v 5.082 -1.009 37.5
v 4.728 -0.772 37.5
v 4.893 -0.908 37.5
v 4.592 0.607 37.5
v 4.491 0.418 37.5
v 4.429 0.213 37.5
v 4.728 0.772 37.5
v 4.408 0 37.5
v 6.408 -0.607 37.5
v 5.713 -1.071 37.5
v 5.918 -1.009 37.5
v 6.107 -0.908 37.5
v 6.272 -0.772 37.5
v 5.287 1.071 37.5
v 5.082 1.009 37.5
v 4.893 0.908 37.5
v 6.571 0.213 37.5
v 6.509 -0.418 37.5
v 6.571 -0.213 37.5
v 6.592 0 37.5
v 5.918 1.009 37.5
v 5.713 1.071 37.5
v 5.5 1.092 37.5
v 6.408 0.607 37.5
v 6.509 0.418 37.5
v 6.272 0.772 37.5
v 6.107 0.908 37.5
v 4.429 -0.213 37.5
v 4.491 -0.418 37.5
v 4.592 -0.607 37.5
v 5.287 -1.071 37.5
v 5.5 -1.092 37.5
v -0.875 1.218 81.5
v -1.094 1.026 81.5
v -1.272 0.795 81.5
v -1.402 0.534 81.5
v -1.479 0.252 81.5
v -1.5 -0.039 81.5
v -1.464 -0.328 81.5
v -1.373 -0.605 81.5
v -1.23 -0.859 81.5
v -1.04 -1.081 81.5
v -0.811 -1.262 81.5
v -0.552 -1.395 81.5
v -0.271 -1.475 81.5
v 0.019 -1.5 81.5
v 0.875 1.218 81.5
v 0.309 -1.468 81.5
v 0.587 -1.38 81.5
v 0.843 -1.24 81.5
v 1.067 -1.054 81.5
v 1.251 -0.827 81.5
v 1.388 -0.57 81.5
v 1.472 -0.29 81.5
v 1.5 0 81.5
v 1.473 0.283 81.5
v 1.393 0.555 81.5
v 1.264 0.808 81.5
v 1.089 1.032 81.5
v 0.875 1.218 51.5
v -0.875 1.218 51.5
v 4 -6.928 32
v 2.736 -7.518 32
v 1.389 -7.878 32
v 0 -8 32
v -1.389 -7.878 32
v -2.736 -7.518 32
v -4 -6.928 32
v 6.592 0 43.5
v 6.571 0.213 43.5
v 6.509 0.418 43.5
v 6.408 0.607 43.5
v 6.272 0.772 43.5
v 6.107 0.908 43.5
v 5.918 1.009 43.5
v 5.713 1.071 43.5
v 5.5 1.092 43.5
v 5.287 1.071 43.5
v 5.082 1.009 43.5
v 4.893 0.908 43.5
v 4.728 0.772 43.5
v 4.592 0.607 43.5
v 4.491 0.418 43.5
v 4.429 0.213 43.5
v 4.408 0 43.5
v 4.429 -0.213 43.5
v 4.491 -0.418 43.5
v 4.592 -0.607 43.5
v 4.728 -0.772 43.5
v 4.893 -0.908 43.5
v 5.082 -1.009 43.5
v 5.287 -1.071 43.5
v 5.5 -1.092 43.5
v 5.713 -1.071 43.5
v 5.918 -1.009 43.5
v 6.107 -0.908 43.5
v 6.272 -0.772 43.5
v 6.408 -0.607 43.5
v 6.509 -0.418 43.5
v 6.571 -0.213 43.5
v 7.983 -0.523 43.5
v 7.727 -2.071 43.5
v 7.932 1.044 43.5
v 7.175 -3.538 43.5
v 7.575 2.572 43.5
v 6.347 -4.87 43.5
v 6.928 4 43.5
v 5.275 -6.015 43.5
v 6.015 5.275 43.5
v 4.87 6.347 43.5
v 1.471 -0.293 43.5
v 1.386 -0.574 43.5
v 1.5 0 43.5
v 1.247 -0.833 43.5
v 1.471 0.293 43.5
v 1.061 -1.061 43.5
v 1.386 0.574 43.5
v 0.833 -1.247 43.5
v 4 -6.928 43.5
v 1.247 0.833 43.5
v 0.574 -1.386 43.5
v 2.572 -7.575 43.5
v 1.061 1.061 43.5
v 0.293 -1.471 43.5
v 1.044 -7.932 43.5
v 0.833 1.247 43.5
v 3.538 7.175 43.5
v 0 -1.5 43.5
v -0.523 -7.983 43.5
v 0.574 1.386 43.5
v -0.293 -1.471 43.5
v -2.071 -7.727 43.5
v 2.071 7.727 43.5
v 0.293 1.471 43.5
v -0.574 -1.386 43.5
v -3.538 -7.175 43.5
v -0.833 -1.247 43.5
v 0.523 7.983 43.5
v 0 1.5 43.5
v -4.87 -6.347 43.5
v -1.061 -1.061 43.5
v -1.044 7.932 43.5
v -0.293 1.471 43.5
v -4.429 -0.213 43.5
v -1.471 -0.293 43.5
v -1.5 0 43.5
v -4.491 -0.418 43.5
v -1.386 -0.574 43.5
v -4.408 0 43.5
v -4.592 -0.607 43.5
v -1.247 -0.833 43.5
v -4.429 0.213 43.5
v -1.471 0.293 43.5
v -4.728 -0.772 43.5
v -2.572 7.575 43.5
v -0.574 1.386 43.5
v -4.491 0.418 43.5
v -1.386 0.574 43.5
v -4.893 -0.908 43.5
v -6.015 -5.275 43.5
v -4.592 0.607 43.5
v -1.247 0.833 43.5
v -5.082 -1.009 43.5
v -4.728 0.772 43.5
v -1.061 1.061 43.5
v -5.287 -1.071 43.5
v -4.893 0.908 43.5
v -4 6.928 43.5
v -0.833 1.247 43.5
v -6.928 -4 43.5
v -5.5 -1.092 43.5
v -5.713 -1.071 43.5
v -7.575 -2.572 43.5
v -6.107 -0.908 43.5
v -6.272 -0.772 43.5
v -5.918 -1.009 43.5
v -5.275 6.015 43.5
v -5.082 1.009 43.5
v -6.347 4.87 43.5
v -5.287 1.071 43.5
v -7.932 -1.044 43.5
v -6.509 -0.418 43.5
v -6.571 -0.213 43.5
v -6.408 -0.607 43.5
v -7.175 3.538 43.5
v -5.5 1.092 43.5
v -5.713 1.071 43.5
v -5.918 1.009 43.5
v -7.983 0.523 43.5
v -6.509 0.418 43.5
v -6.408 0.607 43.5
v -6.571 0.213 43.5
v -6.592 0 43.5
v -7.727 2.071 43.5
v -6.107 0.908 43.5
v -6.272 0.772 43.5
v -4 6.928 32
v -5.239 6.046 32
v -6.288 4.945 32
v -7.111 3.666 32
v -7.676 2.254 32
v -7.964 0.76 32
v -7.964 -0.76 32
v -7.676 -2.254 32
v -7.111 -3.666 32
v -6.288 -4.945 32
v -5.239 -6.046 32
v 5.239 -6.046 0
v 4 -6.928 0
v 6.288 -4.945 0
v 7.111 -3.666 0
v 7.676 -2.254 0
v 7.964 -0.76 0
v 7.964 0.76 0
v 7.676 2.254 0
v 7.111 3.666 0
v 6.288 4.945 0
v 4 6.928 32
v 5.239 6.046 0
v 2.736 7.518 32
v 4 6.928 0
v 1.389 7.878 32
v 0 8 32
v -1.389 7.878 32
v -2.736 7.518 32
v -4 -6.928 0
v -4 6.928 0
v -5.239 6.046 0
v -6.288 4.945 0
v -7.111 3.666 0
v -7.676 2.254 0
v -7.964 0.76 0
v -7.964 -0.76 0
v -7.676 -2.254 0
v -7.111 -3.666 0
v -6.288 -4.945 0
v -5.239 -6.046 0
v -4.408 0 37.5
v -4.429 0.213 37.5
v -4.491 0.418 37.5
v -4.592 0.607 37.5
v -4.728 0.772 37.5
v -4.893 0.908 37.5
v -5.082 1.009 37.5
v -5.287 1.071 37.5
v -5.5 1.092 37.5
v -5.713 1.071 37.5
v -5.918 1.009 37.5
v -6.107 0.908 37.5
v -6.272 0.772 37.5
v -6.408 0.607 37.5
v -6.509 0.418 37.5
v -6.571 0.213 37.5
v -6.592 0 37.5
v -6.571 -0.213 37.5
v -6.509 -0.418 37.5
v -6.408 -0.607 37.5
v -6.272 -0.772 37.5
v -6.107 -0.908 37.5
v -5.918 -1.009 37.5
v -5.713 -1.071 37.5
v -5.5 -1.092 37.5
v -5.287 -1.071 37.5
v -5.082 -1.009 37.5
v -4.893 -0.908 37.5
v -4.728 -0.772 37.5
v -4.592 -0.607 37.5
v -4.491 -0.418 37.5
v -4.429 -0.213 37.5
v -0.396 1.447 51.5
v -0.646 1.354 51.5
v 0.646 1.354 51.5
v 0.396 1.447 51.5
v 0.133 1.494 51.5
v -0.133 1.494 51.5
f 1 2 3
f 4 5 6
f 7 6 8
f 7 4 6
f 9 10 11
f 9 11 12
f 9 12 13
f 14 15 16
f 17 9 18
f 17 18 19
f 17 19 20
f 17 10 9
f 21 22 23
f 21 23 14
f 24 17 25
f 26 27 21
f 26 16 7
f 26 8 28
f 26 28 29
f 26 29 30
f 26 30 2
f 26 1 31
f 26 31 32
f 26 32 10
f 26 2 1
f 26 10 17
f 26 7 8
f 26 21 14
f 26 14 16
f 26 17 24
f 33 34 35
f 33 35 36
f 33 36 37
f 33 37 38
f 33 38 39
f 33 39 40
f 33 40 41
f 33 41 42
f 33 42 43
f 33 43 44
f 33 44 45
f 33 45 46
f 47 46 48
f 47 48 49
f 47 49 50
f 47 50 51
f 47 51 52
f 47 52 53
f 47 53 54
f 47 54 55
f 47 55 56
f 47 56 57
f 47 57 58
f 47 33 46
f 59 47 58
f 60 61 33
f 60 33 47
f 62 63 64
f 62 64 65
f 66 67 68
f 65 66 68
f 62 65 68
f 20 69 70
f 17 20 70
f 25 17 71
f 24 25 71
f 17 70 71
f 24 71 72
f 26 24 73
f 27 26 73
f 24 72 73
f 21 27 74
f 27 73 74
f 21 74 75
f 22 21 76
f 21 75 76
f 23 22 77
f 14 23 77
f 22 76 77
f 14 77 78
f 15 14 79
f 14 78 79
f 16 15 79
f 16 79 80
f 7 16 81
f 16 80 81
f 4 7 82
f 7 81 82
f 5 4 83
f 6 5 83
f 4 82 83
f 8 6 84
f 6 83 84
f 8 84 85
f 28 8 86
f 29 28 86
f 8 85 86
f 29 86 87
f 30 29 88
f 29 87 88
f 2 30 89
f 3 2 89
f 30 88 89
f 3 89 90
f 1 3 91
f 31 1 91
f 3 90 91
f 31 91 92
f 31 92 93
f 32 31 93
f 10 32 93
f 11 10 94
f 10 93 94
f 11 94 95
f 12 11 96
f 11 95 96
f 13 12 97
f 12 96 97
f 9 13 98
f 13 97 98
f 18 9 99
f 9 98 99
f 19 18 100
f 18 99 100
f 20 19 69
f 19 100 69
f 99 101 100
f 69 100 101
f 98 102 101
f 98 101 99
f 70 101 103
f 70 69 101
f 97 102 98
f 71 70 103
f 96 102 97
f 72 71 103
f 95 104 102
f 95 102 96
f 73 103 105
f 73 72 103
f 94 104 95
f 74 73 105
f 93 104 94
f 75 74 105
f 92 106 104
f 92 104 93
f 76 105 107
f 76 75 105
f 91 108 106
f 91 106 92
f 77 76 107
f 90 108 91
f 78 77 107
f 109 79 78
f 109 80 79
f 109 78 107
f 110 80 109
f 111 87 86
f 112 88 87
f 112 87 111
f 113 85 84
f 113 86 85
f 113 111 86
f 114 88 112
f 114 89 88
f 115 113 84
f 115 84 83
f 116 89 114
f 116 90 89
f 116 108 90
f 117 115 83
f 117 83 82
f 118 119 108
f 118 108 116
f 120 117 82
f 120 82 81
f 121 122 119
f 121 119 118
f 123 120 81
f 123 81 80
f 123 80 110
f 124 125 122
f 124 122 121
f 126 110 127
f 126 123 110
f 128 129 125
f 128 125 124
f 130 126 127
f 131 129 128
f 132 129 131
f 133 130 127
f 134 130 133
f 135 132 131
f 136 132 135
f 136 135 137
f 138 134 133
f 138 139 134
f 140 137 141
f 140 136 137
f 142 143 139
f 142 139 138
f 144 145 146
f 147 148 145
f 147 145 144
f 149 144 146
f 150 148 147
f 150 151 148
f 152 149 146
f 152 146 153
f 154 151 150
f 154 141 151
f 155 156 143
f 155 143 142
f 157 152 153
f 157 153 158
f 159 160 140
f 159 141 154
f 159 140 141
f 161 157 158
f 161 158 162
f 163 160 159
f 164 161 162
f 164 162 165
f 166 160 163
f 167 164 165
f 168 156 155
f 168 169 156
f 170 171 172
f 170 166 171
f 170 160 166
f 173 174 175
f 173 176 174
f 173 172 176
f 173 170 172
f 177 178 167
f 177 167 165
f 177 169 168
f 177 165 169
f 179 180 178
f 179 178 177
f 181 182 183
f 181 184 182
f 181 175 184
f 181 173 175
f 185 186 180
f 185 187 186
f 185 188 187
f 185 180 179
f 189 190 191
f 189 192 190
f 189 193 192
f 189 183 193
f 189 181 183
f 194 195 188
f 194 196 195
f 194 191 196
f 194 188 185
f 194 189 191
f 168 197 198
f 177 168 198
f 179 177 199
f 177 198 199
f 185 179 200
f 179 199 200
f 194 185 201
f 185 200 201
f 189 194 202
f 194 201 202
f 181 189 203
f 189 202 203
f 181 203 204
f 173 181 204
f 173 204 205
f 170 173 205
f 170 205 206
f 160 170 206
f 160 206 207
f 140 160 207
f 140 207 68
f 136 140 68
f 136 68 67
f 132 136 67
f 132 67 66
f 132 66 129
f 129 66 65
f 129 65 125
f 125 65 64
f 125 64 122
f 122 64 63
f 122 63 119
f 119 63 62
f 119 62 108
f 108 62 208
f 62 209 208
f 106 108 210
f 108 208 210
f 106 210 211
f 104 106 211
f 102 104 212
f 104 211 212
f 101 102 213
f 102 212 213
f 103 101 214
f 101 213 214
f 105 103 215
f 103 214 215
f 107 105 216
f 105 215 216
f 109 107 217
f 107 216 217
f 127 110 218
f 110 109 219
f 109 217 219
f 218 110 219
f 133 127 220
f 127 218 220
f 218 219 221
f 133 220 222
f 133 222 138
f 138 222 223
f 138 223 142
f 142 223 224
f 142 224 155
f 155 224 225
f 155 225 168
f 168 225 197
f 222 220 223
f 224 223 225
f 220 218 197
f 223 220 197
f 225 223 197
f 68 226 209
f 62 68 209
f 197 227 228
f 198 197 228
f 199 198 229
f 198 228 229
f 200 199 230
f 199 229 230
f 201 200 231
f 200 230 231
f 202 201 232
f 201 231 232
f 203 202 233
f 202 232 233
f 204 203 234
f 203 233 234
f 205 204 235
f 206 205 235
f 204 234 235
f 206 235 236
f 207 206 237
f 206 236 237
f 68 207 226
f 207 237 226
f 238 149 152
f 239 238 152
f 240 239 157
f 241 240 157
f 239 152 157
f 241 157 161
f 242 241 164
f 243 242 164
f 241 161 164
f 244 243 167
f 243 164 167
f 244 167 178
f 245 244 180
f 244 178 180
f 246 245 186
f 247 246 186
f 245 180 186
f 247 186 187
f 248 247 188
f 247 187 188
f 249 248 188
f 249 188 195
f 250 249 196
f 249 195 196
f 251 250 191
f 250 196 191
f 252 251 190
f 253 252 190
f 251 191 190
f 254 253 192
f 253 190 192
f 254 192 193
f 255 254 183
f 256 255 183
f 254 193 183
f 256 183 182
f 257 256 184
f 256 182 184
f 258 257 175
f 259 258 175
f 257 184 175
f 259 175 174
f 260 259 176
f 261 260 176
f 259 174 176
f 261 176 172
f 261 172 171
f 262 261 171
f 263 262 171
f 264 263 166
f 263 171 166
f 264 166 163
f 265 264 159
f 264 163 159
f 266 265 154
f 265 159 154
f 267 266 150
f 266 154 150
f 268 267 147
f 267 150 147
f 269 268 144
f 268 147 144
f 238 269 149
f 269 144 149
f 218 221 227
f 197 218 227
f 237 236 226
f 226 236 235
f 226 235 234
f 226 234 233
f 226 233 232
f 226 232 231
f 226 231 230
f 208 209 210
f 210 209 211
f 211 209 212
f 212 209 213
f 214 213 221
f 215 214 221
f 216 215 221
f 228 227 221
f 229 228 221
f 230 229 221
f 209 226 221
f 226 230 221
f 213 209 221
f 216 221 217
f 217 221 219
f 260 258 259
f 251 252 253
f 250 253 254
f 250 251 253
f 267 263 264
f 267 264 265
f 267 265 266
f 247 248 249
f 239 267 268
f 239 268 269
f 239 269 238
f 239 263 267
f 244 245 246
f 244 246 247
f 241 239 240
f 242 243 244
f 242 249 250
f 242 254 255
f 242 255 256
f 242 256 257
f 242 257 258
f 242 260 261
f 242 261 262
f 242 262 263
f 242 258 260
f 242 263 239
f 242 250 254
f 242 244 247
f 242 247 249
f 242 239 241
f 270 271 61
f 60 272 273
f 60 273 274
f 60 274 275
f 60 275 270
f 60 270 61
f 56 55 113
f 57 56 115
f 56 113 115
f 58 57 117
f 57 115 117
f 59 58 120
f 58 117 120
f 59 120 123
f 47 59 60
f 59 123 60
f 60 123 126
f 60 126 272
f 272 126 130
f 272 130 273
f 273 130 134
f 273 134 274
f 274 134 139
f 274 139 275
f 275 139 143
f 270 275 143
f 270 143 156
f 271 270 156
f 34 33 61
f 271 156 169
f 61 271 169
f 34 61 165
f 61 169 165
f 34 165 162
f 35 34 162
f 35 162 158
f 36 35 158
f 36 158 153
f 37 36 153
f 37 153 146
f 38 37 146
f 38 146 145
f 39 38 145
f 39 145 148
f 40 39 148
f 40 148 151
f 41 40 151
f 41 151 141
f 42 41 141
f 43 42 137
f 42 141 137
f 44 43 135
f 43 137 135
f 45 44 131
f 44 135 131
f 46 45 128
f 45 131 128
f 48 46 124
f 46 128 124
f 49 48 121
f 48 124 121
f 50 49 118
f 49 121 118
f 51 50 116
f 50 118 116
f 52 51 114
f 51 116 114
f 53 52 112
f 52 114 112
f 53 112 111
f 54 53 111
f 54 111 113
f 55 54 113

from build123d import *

# Parameters (mm, degrees)
SKETCH1_R           = 8
BOSS_EXTRUDE1_DEPTH = 32
CUT_EXTRUDE1_DEPTH  = 32
SKETCH4_R           = 8
BOSS_EXTRUDE2_DEPTH = 11.5
SKETCH5_R           = 1.0922
CUT_EXTRUDE2_DEPTH  = 6
SKETCH5_3_R         = 1.5
BOSS_EXTRUDE3_DEPTH = 38
CUT_EXTRUDE3_START  = -30
CUT_EXTRUDE3_DEPTH  = 30


with BuildPart() as part:
    # Sketch1 → Boss-Extrude1 (new body)
    with BuildSketch(Plane.XY):
        Circle(SKETCH1_R)
    extrude(amount=BOSS_EXTRUDE1_DEPTH)

    # Sketch3 → Cut-Extrude1 (cut)
    with BuildSketch(Plane(origin=(0, 0, 0), x_dir=(-1, 0, 0), z_dir=(0, 0, -1))):
        with BuildLine():
            ThreePointArc((4, 6.92820323), (0, 8), (-4, 6.92820323))
            Line((-4, 6.92820323), (4, 6.92820323))
        make_face()
        with BuildLine():
            Line((4, -6.92820323), (-4, -6.92820323))
            ThreePointArc((-4, -6.92820323), (0, -8), (4, -6.92820323))
        make_face()
    extrude(amount=-CUT_EXTRUDE1_DEPTH, mode=Mode.SUBTRACT)

    # Sketch4 → Boss-Extrude2 (add)
    with BuildSketch(Plane.XY.offset(32)):
        Circle(SKETCH4_R)
    extrude(amount=BOSS_EXTRUDE2_DEPTH)

    # Sketch5 → Cut-Extrude2 (cut)
    with BuildSketch(Plane.XY.offset(43.5)):
        with Locations((-5.5, 0)):
            Circle(SKETCH5_R)
        with Locations((5.5, 0)):
            Circle(SKETCH5_R)
    extrude(amount=-CUT_EXTRUDE2_DEPTH, mode=Mode.SUBTRACT)

    # Sketch5<3> → Boss-Extrude3 (add)
    with BuildSketch(Plane.XY.offset(43.5)):
        Circle(SKETCH5_3_R)
    extrude(amount=BOSS_EXTRUDE3_DEPTH)

    # Sketch6 → Cut-Extrude3 (cut)
    with BuildSketch(Plane.XY.offset(81.5).offset(CUT_EXTRUDE3_START)):
        with BuildLine():
            Line((-0.875, 1.218349293), (0.875, 1.218349293))
            ThreePointArc((0.875, 1.218349293), (0, 1.5), (-0.875, 1.218349293))
        make_face()
    extrude(amount=CUT_EXTRUDE3_DEPTH, mode=Mode.SUBTRACT)


solid = part.part
